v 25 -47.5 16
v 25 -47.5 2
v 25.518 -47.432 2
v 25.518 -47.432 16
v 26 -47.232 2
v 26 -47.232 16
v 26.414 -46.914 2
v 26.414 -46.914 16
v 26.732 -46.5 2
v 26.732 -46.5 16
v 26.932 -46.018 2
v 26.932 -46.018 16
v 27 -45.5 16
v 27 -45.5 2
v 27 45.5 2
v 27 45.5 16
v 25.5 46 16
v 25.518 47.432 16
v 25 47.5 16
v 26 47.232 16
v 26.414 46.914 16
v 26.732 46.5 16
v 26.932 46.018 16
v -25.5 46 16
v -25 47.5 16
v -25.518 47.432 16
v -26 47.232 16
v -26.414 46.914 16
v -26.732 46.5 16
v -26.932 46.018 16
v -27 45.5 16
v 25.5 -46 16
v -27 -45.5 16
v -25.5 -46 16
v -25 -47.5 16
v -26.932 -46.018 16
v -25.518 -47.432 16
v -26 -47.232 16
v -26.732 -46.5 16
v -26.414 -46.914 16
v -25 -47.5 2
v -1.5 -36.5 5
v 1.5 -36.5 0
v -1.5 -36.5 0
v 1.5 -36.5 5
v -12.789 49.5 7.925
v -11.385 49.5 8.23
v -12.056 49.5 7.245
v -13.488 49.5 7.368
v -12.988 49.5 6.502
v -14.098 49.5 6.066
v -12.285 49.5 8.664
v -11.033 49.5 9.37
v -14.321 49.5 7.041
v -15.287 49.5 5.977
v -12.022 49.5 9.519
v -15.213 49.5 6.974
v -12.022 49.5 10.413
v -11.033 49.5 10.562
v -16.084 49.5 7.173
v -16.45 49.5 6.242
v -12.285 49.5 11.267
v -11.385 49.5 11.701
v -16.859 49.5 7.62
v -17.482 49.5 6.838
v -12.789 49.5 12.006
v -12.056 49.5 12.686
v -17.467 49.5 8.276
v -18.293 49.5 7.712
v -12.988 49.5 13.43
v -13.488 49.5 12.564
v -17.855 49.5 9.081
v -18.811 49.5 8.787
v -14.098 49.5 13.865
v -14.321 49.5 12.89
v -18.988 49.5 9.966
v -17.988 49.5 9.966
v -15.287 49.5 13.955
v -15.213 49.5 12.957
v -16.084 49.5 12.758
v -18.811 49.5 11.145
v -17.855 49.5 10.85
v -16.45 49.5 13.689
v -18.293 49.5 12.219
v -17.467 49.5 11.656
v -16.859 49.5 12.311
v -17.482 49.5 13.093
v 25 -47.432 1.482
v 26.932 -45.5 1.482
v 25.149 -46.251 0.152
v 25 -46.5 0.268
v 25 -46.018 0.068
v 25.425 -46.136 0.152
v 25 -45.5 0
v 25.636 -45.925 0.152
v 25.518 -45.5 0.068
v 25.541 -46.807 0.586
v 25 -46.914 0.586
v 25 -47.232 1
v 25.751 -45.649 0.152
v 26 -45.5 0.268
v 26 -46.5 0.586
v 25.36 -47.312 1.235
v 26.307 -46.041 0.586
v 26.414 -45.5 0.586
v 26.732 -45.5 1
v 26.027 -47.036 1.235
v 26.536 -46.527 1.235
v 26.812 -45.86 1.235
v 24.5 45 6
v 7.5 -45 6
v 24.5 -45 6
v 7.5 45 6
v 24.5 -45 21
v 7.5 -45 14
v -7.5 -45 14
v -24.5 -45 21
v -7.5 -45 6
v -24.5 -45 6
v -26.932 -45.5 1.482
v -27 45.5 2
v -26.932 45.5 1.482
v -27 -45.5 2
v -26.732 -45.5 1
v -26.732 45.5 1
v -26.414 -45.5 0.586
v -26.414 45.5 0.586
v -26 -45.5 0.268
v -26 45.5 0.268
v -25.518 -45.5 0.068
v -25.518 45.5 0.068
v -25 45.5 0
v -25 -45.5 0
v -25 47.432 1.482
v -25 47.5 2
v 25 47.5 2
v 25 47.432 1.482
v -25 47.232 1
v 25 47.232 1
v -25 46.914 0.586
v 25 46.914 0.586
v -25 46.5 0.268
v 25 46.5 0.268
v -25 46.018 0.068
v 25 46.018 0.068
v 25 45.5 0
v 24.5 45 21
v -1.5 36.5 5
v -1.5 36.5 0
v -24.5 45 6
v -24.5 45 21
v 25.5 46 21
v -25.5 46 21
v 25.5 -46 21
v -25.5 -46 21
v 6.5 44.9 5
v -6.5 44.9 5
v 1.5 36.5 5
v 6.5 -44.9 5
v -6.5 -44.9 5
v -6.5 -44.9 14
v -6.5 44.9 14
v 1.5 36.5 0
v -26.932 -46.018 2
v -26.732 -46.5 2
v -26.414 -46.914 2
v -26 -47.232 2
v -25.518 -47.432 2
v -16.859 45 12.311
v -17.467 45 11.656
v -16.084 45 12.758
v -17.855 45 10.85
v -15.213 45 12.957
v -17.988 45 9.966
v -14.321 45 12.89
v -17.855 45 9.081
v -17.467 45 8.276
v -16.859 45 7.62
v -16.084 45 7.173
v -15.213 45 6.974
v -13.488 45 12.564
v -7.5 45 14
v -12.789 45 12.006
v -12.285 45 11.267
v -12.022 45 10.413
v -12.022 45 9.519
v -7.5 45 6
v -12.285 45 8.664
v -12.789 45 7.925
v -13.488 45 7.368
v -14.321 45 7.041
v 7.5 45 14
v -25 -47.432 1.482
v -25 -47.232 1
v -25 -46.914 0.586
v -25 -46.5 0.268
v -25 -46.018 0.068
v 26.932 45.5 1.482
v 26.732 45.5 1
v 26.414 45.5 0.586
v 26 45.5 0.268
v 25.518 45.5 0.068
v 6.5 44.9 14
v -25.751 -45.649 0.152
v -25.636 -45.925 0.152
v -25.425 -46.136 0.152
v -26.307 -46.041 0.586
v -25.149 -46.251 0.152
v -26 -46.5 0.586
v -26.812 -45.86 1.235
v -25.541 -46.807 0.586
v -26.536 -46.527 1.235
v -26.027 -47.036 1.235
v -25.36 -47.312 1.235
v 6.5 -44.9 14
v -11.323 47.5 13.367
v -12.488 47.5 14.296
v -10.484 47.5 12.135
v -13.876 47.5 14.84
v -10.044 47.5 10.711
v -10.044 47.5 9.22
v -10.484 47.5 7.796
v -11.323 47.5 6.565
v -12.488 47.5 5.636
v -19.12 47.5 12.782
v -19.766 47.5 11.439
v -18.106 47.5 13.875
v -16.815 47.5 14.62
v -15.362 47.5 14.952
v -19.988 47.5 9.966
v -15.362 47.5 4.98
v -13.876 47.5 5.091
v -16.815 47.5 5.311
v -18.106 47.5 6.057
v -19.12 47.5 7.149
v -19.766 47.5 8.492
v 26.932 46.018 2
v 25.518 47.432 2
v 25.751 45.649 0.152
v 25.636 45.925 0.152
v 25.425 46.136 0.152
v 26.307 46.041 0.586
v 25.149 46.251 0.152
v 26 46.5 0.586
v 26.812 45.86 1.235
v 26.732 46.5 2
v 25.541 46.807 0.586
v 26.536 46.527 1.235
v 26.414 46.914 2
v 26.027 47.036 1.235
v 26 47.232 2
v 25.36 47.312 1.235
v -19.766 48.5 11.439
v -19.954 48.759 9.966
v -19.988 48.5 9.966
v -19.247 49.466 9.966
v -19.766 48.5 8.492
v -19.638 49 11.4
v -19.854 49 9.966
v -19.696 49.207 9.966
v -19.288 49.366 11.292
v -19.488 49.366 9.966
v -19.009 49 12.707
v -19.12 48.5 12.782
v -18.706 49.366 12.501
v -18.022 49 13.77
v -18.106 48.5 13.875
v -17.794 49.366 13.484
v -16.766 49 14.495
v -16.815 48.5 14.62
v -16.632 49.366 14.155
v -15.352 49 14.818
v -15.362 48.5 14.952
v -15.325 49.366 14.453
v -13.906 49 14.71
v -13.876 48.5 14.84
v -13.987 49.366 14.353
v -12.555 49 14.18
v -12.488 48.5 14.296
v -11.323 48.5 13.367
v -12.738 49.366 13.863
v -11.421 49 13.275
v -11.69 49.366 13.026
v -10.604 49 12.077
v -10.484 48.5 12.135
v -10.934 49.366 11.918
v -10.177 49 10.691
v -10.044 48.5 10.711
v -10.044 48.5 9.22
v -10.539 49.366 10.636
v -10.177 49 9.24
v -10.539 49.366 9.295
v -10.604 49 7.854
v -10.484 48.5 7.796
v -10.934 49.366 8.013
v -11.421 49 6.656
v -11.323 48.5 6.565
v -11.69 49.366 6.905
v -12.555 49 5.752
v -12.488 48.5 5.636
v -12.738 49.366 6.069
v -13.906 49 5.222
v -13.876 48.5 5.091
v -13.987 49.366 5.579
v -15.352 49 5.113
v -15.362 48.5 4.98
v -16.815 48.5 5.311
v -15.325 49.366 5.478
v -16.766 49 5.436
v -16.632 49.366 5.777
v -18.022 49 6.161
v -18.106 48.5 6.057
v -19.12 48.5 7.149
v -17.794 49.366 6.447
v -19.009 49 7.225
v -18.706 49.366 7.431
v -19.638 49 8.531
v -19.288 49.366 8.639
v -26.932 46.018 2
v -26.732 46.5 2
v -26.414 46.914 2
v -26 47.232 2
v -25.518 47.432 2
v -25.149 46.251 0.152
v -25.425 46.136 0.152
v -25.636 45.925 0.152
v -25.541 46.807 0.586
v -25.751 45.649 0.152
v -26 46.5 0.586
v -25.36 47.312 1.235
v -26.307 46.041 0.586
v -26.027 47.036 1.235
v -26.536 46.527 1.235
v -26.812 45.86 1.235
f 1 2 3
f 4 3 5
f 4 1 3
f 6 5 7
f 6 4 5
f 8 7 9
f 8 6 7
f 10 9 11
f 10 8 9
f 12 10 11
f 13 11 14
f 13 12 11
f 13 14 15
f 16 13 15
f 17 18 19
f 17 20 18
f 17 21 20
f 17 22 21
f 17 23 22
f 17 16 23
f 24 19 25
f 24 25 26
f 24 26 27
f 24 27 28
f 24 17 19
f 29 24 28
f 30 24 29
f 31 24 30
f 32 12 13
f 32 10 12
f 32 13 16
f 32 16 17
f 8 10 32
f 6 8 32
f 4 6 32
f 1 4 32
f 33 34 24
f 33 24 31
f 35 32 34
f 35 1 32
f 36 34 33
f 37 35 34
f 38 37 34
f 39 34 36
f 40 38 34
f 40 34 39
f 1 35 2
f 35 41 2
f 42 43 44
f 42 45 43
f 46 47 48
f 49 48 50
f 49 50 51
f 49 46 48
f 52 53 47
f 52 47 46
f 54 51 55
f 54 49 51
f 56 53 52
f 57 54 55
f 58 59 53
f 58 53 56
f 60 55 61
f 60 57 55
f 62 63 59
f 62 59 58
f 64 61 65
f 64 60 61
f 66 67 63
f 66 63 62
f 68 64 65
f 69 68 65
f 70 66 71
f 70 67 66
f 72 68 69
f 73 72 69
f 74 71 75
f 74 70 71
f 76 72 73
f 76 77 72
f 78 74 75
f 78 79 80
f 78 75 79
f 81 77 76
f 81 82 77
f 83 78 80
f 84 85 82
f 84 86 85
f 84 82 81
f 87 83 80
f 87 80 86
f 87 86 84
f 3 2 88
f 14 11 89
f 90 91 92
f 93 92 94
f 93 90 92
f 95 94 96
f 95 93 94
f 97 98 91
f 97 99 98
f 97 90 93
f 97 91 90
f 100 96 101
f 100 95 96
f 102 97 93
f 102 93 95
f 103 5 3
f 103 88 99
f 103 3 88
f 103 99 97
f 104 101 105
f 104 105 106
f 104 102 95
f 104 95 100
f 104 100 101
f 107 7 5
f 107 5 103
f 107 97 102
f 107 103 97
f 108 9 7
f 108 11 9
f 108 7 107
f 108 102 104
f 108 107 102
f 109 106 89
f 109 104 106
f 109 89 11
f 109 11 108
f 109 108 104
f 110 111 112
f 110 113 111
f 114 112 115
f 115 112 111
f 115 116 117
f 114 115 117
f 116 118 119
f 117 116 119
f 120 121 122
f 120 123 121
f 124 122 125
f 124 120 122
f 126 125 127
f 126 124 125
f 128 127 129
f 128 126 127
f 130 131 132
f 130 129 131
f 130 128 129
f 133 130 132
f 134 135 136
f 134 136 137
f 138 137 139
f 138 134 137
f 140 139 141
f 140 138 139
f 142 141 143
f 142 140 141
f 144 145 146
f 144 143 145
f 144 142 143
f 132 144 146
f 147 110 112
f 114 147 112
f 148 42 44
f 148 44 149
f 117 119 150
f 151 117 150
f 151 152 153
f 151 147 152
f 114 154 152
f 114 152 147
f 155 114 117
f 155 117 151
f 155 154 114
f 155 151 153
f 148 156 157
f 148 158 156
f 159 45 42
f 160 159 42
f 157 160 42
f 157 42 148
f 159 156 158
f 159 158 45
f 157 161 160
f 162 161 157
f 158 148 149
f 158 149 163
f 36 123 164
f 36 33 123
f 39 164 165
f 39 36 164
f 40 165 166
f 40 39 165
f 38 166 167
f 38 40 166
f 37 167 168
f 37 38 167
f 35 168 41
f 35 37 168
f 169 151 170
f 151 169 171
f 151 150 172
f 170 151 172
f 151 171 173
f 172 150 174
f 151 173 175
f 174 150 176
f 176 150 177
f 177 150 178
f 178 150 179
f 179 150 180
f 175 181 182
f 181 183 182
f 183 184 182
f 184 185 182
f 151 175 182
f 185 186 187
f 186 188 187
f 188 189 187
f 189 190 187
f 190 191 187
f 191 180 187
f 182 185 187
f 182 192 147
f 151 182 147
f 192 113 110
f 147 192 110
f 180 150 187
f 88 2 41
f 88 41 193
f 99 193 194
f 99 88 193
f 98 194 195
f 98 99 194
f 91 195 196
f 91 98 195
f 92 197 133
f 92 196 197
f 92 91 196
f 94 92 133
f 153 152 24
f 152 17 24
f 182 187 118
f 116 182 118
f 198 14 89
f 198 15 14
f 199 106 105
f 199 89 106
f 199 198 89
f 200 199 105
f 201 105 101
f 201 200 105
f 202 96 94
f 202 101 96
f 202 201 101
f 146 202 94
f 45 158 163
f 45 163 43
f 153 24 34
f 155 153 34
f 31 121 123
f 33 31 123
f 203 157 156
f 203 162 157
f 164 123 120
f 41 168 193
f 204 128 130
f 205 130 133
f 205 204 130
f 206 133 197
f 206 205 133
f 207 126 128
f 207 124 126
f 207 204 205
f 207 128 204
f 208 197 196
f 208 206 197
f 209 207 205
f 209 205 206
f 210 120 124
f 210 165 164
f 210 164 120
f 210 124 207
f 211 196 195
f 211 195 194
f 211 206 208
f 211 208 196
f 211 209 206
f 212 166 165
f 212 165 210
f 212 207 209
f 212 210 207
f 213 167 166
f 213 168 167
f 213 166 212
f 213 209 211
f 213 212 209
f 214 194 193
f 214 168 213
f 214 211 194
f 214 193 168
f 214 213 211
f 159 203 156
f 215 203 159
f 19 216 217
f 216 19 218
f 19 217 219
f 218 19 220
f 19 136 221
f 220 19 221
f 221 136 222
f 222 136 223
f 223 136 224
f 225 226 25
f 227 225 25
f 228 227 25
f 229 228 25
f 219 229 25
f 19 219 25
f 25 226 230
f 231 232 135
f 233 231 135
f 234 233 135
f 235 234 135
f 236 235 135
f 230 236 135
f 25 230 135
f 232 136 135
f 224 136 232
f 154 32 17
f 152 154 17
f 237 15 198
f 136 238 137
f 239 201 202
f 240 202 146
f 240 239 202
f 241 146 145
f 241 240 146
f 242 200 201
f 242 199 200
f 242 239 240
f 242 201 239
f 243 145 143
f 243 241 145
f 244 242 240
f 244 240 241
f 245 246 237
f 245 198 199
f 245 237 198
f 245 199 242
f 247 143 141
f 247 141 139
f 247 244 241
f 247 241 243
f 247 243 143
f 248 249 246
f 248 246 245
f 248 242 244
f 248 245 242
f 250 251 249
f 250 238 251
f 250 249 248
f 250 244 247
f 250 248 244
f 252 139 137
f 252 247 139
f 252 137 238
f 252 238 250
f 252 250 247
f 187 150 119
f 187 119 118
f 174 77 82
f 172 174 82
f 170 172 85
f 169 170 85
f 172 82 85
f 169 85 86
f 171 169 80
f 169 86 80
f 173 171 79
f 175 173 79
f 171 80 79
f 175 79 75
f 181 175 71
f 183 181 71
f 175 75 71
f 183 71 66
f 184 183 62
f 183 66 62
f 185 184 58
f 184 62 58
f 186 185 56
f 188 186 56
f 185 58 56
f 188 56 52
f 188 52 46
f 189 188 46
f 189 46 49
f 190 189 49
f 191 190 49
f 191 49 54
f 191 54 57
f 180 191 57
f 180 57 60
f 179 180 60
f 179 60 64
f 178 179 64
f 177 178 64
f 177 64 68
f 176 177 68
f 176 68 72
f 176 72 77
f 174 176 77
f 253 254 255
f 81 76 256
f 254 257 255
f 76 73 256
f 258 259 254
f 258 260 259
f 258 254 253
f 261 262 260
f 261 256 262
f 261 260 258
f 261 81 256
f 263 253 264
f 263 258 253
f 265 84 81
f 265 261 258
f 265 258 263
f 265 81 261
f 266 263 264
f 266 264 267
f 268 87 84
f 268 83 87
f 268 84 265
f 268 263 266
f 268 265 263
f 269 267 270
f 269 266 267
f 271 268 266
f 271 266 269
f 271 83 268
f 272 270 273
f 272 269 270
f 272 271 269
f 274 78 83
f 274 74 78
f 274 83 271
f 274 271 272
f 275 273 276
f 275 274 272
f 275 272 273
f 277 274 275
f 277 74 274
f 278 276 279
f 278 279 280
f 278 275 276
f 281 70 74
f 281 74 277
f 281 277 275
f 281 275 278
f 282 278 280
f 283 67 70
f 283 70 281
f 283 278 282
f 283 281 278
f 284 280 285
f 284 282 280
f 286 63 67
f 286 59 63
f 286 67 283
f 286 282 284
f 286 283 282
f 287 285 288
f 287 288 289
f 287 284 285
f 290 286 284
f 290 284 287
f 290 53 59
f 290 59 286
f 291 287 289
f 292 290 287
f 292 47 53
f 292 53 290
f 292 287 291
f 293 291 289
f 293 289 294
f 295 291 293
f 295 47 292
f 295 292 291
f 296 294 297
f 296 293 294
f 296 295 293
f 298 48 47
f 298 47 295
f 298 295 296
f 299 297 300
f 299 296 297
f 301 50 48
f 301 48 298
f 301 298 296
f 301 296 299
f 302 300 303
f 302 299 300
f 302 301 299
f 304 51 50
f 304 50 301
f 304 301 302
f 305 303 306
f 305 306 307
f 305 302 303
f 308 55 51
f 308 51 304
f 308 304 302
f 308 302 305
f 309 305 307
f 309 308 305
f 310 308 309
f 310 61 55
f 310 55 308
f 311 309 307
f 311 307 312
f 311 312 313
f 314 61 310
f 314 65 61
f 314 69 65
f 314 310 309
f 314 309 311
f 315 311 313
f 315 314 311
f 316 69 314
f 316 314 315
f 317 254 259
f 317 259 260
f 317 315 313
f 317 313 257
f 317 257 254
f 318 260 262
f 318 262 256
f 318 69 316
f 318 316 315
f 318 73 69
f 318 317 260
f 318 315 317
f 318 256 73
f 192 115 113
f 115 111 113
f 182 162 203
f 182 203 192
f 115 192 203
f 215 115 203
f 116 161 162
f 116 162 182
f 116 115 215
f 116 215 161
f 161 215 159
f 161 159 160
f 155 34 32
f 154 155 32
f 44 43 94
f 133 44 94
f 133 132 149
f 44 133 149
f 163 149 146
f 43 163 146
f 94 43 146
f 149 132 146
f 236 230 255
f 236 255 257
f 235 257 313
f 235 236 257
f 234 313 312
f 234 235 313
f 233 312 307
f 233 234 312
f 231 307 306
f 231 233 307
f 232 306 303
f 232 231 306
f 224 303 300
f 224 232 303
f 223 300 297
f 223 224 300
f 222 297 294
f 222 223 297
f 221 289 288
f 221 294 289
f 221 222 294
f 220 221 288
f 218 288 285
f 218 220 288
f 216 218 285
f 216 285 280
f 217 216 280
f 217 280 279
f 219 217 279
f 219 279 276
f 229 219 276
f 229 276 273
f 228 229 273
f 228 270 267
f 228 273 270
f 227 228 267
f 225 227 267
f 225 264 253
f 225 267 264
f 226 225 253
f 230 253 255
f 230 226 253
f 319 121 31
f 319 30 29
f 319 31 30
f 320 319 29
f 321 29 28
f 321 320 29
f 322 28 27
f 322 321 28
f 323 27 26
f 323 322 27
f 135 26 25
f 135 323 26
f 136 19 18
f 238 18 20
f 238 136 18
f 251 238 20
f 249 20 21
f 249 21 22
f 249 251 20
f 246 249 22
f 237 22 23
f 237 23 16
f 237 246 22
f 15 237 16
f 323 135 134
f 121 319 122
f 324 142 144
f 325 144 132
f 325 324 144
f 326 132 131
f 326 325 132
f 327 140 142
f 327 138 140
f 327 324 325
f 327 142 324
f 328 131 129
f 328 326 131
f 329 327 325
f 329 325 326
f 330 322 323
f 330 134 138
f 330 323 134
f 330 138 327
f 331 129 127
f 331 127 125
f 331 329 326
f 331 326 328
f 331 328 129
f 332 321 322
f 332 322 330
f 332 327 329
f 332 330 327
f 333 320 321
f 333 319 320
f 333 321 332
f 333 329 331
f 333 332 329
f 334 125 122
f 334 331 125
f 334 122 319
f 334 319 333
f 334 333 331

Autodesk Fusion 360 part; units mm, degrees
sketch "Sketch1" plane through (0, 0, 0) normal (0, 0, 1) x (1, 0, 0)
  line L0 (-27, -47.5) -> (27, -47.5)
  line L1 (27, -47.5) -> (27, 47.5)
  line L2 (27, 47.5) -> (-27, 47.5)
  line L3 (-27, 47.5) -> (-27, -47.5)
  line L4 (-27, -47.5) -> (27, 47.5) construction
  line L5 (27, -47.5) -> (-27, 47.5) construction
  dimension "d1" = 95
  dimension "d2" = 54
extrude "Extrude1" add sketch "Sketch1" along normal blind 11
sketch "Sketch2" plane through (0, 0, 11) normal (0, 0, 1) x (-1, 0, 0)
  line L0 (27, -47.5) -> (27, 47.5)
  line L1 (27, 47.5) -> (-27, 47.5)
  line L2 (-27, 47.5) -> (-27, -47.5)
  line L3 (-27, -47.5) -> (27, -47.5)
  line L4 (24.5, -45) -> (-24.5, -45)
  line L5 (-24.5, -45) -> (-24.5, 45)
  line L6 (-24.5, 45) -> (24.5, 45)
  line L7 (24.5, 45) -> (24.5, -45)
  line L8 (24.5, -45) -> (-24.5, 45) construction
  line L9 (-24.5, -45) -> (24.5, 45) construction
  dimension "d5" = 2.5
  dimension "d6" = 2.5
  dimension "d7" = 2.5
  dimension "d8" = 90
extrude "Extrude2" add sketch "Sketch2" along normal blind 5
extrude "Extrude3" cut 1 faces at (-8.1667, -15, 11) along direction (0, 0, -1) blind 5
sketch "Sketch3" plane through (0, 0, 6) normal (0, 0, 1) x (-1, 0, 0)
  line L0 (-24.5, 45) -> (-24.5, -45)
  line L1 (-24.5, -45) -> (24.5, -45)
  line L2 (24.5, -45) -> (24.5, 45)
  line L3 (24.5, 45) -> (-24.5, 45)
  line L4 (7.5, 45) -> (-7.5, 45)
  line L5 (-7.5, 45) -> (-7.5, -45)
  line L6 (-7.5, -45) -> (7.5, -45)
  line L7 (7.5, -45) -> (7.5, 45)
  line L8 (7.5, 45) -> (-7.5, -45) construction
  line L9 (-7.5, 45) -> (7.5, -45) construction
  dimension "d13" = 90
  dimension "d14" = 15
extrude "Extrude4" add sketch "Sketch3" along normal blind 8 contours L1 L3 L4 L5 L6 L7
sketch "Sketch4" plane through (0, 0, 14) normal (0, 0, 1) x (-1, 0, 0)
  line L0 (7.5, -45) -> (7.5, 45)
  line L1 (7.5, 45) -> (-7.5, 45)
  line L2 (-7.5, 45) -> (-7.5, -45)
  line L3 (-7.5, -45) -> (7.5, -45)
  line L4 (-6.5, 44.9) -> (6.5, 44.9)
  line L5 (6.5, 44.9) -> (6.5, -44.9)
  line L6 (6.5, -44.9) -> (-6.5, -44.9)
  line L7 (-6.5, -44.9) -> (-6.5, 44.9)
  line L8 (-6.5, 44.9) -> (6.5, -44.9) construction
  line L9 (6.5, 44.9) -> (-6.5, -44.9) construction
  dimension "d41" = 0.1
  dimension "d42" = 13
extrude "Extrude5" cut sketch "Sketch4" against normal blind 9 contours L4 L5 L6 L7
sketch "Sketch5" plane through (0, 0, 5) normal (0, 0, 1) x (-1, 0, 0)
  line L0 (-6.5, -44.9) -> (6.5, -44.9)
  line L1 (6.5, -44.9) -> (6.5, 44.9)
  line L2 (6.5, 44.9) -> (-6.5, 44.9)
  line L3 (-6.5, 44.9) -> (-6.5, -44.9)
  line L4 (-1.5, 36.5) -> (1.5, 36.5)
  line L5 (1.5, 36.5) -> (1.5, -36.5)
  line L6 (1.5, -36.5) -> (-1.5, -36.5)
  line L7 (-1.5, -36.5) -> (-1.5, 36.5)
  line L8 (-1.5, 36.5) -> (1.5, -36.5) construction
  line L9 (1.5, 36.5) -> (-1.5, -36.5) construction
  dimension "d21" = 3
  dimension "d22" = 73
extrude "Extrude6" cut sketch "Sketch5" against normal blind 5 contours L4 L5 L6 L7
sketch "Sketch6" plane through (0, 0, 16) normal (0, 0, 1) x (-1, 0, 0)
  line L0 (-24.5, 45) -> (24.5, 45)
  line L1 (24.5, 45) -> (24.5, -45)
  line L2 (24.5, -45) -> (-24.5, -45)
  line L3 (-24.5, -45) -> (-24.5, 45)
  line L4 (-27, -47.5) -> (27, -47.5)
  line L5 (27, -47.5) -> (27, 47.5)
  line L6 (27, 47.5) -> (-27, 47.5)
  line L7 (-27, 47.5) -> (-27, -47.5)
  line L8 (-25.5, -46) -> (25.5, -46)
  line L9 (25.5, -46) -> (25.5, 46)
  line L10 (25.5, 46) -> (-25.5, 46)
  line L11 (-25.5, 46) -> (-25.5, -46)
  line L12 (-25.5, -46) -> (25.5, 46) construction
  line L13 (25.5, -46) -> (-25.5, 46) construction
  dimension "d25" = 1.5
  dimension "d26" = 1.5
extrude "Extrude7" add sketch "Sketch6" along normal blind 5 contours L8 L9 L10 L11
sketch "Sketch7" plane through (0, 47.5, 0) normal (0, 1, 0) x (-1, 0, 0)
  line L0 (-27, 0) -> (27, 0)
  line L1 (27, 0) -> (27, 16)
  line L2 (27, 16) -> (-27, 16)
  line L3 (-27, 16) -> (-27, 0)
  circle A0 centre (14.9884, 9.9657) radius 5
  dimension "d29" = 10
extrude "Extrude8" add sketch "Sketch7" along normal blind 2 contours A0
fillet "Fillet1" radius 1 1 edges at (-10.3267, 49.5, 8.1576)
sketch "Sketch8" plane through (0, 49.5, 0) normal (0, 1, 0) x (-1, 0, 0)
  circle A0 centre (14.9884, 9.9657) radius 4
sketch "Sketch9" plane through (0, 49.5, 0) normal (0, 1, 0) x (-1, 0, 0)
  circle A0 centre (14.9884, 9.9657) radius 3
  point P0 (14.9884, 9.9657)
  dimension "d34" = 6
extrude "Extrude9" cut sketch "Sketch9" against normal blind 5
fillet "Fillet2" radius 2 4 edges at (-27, 47.5, 8) (27, 47.5, 8) (-27, -47.5, 8) (27, -47.5, 8)
fillet "Fillet3" radius 2 8 edges at (27, 0, 0) (26.4142, 46.9142, 0) (0, 47.5, 0) (-26.4142, 46.9142, 0) (-27, 0, 0) (-26.4142, -46.9142, 0) (0, -47.5, 0) (26.4142, -46.9142, 0)
